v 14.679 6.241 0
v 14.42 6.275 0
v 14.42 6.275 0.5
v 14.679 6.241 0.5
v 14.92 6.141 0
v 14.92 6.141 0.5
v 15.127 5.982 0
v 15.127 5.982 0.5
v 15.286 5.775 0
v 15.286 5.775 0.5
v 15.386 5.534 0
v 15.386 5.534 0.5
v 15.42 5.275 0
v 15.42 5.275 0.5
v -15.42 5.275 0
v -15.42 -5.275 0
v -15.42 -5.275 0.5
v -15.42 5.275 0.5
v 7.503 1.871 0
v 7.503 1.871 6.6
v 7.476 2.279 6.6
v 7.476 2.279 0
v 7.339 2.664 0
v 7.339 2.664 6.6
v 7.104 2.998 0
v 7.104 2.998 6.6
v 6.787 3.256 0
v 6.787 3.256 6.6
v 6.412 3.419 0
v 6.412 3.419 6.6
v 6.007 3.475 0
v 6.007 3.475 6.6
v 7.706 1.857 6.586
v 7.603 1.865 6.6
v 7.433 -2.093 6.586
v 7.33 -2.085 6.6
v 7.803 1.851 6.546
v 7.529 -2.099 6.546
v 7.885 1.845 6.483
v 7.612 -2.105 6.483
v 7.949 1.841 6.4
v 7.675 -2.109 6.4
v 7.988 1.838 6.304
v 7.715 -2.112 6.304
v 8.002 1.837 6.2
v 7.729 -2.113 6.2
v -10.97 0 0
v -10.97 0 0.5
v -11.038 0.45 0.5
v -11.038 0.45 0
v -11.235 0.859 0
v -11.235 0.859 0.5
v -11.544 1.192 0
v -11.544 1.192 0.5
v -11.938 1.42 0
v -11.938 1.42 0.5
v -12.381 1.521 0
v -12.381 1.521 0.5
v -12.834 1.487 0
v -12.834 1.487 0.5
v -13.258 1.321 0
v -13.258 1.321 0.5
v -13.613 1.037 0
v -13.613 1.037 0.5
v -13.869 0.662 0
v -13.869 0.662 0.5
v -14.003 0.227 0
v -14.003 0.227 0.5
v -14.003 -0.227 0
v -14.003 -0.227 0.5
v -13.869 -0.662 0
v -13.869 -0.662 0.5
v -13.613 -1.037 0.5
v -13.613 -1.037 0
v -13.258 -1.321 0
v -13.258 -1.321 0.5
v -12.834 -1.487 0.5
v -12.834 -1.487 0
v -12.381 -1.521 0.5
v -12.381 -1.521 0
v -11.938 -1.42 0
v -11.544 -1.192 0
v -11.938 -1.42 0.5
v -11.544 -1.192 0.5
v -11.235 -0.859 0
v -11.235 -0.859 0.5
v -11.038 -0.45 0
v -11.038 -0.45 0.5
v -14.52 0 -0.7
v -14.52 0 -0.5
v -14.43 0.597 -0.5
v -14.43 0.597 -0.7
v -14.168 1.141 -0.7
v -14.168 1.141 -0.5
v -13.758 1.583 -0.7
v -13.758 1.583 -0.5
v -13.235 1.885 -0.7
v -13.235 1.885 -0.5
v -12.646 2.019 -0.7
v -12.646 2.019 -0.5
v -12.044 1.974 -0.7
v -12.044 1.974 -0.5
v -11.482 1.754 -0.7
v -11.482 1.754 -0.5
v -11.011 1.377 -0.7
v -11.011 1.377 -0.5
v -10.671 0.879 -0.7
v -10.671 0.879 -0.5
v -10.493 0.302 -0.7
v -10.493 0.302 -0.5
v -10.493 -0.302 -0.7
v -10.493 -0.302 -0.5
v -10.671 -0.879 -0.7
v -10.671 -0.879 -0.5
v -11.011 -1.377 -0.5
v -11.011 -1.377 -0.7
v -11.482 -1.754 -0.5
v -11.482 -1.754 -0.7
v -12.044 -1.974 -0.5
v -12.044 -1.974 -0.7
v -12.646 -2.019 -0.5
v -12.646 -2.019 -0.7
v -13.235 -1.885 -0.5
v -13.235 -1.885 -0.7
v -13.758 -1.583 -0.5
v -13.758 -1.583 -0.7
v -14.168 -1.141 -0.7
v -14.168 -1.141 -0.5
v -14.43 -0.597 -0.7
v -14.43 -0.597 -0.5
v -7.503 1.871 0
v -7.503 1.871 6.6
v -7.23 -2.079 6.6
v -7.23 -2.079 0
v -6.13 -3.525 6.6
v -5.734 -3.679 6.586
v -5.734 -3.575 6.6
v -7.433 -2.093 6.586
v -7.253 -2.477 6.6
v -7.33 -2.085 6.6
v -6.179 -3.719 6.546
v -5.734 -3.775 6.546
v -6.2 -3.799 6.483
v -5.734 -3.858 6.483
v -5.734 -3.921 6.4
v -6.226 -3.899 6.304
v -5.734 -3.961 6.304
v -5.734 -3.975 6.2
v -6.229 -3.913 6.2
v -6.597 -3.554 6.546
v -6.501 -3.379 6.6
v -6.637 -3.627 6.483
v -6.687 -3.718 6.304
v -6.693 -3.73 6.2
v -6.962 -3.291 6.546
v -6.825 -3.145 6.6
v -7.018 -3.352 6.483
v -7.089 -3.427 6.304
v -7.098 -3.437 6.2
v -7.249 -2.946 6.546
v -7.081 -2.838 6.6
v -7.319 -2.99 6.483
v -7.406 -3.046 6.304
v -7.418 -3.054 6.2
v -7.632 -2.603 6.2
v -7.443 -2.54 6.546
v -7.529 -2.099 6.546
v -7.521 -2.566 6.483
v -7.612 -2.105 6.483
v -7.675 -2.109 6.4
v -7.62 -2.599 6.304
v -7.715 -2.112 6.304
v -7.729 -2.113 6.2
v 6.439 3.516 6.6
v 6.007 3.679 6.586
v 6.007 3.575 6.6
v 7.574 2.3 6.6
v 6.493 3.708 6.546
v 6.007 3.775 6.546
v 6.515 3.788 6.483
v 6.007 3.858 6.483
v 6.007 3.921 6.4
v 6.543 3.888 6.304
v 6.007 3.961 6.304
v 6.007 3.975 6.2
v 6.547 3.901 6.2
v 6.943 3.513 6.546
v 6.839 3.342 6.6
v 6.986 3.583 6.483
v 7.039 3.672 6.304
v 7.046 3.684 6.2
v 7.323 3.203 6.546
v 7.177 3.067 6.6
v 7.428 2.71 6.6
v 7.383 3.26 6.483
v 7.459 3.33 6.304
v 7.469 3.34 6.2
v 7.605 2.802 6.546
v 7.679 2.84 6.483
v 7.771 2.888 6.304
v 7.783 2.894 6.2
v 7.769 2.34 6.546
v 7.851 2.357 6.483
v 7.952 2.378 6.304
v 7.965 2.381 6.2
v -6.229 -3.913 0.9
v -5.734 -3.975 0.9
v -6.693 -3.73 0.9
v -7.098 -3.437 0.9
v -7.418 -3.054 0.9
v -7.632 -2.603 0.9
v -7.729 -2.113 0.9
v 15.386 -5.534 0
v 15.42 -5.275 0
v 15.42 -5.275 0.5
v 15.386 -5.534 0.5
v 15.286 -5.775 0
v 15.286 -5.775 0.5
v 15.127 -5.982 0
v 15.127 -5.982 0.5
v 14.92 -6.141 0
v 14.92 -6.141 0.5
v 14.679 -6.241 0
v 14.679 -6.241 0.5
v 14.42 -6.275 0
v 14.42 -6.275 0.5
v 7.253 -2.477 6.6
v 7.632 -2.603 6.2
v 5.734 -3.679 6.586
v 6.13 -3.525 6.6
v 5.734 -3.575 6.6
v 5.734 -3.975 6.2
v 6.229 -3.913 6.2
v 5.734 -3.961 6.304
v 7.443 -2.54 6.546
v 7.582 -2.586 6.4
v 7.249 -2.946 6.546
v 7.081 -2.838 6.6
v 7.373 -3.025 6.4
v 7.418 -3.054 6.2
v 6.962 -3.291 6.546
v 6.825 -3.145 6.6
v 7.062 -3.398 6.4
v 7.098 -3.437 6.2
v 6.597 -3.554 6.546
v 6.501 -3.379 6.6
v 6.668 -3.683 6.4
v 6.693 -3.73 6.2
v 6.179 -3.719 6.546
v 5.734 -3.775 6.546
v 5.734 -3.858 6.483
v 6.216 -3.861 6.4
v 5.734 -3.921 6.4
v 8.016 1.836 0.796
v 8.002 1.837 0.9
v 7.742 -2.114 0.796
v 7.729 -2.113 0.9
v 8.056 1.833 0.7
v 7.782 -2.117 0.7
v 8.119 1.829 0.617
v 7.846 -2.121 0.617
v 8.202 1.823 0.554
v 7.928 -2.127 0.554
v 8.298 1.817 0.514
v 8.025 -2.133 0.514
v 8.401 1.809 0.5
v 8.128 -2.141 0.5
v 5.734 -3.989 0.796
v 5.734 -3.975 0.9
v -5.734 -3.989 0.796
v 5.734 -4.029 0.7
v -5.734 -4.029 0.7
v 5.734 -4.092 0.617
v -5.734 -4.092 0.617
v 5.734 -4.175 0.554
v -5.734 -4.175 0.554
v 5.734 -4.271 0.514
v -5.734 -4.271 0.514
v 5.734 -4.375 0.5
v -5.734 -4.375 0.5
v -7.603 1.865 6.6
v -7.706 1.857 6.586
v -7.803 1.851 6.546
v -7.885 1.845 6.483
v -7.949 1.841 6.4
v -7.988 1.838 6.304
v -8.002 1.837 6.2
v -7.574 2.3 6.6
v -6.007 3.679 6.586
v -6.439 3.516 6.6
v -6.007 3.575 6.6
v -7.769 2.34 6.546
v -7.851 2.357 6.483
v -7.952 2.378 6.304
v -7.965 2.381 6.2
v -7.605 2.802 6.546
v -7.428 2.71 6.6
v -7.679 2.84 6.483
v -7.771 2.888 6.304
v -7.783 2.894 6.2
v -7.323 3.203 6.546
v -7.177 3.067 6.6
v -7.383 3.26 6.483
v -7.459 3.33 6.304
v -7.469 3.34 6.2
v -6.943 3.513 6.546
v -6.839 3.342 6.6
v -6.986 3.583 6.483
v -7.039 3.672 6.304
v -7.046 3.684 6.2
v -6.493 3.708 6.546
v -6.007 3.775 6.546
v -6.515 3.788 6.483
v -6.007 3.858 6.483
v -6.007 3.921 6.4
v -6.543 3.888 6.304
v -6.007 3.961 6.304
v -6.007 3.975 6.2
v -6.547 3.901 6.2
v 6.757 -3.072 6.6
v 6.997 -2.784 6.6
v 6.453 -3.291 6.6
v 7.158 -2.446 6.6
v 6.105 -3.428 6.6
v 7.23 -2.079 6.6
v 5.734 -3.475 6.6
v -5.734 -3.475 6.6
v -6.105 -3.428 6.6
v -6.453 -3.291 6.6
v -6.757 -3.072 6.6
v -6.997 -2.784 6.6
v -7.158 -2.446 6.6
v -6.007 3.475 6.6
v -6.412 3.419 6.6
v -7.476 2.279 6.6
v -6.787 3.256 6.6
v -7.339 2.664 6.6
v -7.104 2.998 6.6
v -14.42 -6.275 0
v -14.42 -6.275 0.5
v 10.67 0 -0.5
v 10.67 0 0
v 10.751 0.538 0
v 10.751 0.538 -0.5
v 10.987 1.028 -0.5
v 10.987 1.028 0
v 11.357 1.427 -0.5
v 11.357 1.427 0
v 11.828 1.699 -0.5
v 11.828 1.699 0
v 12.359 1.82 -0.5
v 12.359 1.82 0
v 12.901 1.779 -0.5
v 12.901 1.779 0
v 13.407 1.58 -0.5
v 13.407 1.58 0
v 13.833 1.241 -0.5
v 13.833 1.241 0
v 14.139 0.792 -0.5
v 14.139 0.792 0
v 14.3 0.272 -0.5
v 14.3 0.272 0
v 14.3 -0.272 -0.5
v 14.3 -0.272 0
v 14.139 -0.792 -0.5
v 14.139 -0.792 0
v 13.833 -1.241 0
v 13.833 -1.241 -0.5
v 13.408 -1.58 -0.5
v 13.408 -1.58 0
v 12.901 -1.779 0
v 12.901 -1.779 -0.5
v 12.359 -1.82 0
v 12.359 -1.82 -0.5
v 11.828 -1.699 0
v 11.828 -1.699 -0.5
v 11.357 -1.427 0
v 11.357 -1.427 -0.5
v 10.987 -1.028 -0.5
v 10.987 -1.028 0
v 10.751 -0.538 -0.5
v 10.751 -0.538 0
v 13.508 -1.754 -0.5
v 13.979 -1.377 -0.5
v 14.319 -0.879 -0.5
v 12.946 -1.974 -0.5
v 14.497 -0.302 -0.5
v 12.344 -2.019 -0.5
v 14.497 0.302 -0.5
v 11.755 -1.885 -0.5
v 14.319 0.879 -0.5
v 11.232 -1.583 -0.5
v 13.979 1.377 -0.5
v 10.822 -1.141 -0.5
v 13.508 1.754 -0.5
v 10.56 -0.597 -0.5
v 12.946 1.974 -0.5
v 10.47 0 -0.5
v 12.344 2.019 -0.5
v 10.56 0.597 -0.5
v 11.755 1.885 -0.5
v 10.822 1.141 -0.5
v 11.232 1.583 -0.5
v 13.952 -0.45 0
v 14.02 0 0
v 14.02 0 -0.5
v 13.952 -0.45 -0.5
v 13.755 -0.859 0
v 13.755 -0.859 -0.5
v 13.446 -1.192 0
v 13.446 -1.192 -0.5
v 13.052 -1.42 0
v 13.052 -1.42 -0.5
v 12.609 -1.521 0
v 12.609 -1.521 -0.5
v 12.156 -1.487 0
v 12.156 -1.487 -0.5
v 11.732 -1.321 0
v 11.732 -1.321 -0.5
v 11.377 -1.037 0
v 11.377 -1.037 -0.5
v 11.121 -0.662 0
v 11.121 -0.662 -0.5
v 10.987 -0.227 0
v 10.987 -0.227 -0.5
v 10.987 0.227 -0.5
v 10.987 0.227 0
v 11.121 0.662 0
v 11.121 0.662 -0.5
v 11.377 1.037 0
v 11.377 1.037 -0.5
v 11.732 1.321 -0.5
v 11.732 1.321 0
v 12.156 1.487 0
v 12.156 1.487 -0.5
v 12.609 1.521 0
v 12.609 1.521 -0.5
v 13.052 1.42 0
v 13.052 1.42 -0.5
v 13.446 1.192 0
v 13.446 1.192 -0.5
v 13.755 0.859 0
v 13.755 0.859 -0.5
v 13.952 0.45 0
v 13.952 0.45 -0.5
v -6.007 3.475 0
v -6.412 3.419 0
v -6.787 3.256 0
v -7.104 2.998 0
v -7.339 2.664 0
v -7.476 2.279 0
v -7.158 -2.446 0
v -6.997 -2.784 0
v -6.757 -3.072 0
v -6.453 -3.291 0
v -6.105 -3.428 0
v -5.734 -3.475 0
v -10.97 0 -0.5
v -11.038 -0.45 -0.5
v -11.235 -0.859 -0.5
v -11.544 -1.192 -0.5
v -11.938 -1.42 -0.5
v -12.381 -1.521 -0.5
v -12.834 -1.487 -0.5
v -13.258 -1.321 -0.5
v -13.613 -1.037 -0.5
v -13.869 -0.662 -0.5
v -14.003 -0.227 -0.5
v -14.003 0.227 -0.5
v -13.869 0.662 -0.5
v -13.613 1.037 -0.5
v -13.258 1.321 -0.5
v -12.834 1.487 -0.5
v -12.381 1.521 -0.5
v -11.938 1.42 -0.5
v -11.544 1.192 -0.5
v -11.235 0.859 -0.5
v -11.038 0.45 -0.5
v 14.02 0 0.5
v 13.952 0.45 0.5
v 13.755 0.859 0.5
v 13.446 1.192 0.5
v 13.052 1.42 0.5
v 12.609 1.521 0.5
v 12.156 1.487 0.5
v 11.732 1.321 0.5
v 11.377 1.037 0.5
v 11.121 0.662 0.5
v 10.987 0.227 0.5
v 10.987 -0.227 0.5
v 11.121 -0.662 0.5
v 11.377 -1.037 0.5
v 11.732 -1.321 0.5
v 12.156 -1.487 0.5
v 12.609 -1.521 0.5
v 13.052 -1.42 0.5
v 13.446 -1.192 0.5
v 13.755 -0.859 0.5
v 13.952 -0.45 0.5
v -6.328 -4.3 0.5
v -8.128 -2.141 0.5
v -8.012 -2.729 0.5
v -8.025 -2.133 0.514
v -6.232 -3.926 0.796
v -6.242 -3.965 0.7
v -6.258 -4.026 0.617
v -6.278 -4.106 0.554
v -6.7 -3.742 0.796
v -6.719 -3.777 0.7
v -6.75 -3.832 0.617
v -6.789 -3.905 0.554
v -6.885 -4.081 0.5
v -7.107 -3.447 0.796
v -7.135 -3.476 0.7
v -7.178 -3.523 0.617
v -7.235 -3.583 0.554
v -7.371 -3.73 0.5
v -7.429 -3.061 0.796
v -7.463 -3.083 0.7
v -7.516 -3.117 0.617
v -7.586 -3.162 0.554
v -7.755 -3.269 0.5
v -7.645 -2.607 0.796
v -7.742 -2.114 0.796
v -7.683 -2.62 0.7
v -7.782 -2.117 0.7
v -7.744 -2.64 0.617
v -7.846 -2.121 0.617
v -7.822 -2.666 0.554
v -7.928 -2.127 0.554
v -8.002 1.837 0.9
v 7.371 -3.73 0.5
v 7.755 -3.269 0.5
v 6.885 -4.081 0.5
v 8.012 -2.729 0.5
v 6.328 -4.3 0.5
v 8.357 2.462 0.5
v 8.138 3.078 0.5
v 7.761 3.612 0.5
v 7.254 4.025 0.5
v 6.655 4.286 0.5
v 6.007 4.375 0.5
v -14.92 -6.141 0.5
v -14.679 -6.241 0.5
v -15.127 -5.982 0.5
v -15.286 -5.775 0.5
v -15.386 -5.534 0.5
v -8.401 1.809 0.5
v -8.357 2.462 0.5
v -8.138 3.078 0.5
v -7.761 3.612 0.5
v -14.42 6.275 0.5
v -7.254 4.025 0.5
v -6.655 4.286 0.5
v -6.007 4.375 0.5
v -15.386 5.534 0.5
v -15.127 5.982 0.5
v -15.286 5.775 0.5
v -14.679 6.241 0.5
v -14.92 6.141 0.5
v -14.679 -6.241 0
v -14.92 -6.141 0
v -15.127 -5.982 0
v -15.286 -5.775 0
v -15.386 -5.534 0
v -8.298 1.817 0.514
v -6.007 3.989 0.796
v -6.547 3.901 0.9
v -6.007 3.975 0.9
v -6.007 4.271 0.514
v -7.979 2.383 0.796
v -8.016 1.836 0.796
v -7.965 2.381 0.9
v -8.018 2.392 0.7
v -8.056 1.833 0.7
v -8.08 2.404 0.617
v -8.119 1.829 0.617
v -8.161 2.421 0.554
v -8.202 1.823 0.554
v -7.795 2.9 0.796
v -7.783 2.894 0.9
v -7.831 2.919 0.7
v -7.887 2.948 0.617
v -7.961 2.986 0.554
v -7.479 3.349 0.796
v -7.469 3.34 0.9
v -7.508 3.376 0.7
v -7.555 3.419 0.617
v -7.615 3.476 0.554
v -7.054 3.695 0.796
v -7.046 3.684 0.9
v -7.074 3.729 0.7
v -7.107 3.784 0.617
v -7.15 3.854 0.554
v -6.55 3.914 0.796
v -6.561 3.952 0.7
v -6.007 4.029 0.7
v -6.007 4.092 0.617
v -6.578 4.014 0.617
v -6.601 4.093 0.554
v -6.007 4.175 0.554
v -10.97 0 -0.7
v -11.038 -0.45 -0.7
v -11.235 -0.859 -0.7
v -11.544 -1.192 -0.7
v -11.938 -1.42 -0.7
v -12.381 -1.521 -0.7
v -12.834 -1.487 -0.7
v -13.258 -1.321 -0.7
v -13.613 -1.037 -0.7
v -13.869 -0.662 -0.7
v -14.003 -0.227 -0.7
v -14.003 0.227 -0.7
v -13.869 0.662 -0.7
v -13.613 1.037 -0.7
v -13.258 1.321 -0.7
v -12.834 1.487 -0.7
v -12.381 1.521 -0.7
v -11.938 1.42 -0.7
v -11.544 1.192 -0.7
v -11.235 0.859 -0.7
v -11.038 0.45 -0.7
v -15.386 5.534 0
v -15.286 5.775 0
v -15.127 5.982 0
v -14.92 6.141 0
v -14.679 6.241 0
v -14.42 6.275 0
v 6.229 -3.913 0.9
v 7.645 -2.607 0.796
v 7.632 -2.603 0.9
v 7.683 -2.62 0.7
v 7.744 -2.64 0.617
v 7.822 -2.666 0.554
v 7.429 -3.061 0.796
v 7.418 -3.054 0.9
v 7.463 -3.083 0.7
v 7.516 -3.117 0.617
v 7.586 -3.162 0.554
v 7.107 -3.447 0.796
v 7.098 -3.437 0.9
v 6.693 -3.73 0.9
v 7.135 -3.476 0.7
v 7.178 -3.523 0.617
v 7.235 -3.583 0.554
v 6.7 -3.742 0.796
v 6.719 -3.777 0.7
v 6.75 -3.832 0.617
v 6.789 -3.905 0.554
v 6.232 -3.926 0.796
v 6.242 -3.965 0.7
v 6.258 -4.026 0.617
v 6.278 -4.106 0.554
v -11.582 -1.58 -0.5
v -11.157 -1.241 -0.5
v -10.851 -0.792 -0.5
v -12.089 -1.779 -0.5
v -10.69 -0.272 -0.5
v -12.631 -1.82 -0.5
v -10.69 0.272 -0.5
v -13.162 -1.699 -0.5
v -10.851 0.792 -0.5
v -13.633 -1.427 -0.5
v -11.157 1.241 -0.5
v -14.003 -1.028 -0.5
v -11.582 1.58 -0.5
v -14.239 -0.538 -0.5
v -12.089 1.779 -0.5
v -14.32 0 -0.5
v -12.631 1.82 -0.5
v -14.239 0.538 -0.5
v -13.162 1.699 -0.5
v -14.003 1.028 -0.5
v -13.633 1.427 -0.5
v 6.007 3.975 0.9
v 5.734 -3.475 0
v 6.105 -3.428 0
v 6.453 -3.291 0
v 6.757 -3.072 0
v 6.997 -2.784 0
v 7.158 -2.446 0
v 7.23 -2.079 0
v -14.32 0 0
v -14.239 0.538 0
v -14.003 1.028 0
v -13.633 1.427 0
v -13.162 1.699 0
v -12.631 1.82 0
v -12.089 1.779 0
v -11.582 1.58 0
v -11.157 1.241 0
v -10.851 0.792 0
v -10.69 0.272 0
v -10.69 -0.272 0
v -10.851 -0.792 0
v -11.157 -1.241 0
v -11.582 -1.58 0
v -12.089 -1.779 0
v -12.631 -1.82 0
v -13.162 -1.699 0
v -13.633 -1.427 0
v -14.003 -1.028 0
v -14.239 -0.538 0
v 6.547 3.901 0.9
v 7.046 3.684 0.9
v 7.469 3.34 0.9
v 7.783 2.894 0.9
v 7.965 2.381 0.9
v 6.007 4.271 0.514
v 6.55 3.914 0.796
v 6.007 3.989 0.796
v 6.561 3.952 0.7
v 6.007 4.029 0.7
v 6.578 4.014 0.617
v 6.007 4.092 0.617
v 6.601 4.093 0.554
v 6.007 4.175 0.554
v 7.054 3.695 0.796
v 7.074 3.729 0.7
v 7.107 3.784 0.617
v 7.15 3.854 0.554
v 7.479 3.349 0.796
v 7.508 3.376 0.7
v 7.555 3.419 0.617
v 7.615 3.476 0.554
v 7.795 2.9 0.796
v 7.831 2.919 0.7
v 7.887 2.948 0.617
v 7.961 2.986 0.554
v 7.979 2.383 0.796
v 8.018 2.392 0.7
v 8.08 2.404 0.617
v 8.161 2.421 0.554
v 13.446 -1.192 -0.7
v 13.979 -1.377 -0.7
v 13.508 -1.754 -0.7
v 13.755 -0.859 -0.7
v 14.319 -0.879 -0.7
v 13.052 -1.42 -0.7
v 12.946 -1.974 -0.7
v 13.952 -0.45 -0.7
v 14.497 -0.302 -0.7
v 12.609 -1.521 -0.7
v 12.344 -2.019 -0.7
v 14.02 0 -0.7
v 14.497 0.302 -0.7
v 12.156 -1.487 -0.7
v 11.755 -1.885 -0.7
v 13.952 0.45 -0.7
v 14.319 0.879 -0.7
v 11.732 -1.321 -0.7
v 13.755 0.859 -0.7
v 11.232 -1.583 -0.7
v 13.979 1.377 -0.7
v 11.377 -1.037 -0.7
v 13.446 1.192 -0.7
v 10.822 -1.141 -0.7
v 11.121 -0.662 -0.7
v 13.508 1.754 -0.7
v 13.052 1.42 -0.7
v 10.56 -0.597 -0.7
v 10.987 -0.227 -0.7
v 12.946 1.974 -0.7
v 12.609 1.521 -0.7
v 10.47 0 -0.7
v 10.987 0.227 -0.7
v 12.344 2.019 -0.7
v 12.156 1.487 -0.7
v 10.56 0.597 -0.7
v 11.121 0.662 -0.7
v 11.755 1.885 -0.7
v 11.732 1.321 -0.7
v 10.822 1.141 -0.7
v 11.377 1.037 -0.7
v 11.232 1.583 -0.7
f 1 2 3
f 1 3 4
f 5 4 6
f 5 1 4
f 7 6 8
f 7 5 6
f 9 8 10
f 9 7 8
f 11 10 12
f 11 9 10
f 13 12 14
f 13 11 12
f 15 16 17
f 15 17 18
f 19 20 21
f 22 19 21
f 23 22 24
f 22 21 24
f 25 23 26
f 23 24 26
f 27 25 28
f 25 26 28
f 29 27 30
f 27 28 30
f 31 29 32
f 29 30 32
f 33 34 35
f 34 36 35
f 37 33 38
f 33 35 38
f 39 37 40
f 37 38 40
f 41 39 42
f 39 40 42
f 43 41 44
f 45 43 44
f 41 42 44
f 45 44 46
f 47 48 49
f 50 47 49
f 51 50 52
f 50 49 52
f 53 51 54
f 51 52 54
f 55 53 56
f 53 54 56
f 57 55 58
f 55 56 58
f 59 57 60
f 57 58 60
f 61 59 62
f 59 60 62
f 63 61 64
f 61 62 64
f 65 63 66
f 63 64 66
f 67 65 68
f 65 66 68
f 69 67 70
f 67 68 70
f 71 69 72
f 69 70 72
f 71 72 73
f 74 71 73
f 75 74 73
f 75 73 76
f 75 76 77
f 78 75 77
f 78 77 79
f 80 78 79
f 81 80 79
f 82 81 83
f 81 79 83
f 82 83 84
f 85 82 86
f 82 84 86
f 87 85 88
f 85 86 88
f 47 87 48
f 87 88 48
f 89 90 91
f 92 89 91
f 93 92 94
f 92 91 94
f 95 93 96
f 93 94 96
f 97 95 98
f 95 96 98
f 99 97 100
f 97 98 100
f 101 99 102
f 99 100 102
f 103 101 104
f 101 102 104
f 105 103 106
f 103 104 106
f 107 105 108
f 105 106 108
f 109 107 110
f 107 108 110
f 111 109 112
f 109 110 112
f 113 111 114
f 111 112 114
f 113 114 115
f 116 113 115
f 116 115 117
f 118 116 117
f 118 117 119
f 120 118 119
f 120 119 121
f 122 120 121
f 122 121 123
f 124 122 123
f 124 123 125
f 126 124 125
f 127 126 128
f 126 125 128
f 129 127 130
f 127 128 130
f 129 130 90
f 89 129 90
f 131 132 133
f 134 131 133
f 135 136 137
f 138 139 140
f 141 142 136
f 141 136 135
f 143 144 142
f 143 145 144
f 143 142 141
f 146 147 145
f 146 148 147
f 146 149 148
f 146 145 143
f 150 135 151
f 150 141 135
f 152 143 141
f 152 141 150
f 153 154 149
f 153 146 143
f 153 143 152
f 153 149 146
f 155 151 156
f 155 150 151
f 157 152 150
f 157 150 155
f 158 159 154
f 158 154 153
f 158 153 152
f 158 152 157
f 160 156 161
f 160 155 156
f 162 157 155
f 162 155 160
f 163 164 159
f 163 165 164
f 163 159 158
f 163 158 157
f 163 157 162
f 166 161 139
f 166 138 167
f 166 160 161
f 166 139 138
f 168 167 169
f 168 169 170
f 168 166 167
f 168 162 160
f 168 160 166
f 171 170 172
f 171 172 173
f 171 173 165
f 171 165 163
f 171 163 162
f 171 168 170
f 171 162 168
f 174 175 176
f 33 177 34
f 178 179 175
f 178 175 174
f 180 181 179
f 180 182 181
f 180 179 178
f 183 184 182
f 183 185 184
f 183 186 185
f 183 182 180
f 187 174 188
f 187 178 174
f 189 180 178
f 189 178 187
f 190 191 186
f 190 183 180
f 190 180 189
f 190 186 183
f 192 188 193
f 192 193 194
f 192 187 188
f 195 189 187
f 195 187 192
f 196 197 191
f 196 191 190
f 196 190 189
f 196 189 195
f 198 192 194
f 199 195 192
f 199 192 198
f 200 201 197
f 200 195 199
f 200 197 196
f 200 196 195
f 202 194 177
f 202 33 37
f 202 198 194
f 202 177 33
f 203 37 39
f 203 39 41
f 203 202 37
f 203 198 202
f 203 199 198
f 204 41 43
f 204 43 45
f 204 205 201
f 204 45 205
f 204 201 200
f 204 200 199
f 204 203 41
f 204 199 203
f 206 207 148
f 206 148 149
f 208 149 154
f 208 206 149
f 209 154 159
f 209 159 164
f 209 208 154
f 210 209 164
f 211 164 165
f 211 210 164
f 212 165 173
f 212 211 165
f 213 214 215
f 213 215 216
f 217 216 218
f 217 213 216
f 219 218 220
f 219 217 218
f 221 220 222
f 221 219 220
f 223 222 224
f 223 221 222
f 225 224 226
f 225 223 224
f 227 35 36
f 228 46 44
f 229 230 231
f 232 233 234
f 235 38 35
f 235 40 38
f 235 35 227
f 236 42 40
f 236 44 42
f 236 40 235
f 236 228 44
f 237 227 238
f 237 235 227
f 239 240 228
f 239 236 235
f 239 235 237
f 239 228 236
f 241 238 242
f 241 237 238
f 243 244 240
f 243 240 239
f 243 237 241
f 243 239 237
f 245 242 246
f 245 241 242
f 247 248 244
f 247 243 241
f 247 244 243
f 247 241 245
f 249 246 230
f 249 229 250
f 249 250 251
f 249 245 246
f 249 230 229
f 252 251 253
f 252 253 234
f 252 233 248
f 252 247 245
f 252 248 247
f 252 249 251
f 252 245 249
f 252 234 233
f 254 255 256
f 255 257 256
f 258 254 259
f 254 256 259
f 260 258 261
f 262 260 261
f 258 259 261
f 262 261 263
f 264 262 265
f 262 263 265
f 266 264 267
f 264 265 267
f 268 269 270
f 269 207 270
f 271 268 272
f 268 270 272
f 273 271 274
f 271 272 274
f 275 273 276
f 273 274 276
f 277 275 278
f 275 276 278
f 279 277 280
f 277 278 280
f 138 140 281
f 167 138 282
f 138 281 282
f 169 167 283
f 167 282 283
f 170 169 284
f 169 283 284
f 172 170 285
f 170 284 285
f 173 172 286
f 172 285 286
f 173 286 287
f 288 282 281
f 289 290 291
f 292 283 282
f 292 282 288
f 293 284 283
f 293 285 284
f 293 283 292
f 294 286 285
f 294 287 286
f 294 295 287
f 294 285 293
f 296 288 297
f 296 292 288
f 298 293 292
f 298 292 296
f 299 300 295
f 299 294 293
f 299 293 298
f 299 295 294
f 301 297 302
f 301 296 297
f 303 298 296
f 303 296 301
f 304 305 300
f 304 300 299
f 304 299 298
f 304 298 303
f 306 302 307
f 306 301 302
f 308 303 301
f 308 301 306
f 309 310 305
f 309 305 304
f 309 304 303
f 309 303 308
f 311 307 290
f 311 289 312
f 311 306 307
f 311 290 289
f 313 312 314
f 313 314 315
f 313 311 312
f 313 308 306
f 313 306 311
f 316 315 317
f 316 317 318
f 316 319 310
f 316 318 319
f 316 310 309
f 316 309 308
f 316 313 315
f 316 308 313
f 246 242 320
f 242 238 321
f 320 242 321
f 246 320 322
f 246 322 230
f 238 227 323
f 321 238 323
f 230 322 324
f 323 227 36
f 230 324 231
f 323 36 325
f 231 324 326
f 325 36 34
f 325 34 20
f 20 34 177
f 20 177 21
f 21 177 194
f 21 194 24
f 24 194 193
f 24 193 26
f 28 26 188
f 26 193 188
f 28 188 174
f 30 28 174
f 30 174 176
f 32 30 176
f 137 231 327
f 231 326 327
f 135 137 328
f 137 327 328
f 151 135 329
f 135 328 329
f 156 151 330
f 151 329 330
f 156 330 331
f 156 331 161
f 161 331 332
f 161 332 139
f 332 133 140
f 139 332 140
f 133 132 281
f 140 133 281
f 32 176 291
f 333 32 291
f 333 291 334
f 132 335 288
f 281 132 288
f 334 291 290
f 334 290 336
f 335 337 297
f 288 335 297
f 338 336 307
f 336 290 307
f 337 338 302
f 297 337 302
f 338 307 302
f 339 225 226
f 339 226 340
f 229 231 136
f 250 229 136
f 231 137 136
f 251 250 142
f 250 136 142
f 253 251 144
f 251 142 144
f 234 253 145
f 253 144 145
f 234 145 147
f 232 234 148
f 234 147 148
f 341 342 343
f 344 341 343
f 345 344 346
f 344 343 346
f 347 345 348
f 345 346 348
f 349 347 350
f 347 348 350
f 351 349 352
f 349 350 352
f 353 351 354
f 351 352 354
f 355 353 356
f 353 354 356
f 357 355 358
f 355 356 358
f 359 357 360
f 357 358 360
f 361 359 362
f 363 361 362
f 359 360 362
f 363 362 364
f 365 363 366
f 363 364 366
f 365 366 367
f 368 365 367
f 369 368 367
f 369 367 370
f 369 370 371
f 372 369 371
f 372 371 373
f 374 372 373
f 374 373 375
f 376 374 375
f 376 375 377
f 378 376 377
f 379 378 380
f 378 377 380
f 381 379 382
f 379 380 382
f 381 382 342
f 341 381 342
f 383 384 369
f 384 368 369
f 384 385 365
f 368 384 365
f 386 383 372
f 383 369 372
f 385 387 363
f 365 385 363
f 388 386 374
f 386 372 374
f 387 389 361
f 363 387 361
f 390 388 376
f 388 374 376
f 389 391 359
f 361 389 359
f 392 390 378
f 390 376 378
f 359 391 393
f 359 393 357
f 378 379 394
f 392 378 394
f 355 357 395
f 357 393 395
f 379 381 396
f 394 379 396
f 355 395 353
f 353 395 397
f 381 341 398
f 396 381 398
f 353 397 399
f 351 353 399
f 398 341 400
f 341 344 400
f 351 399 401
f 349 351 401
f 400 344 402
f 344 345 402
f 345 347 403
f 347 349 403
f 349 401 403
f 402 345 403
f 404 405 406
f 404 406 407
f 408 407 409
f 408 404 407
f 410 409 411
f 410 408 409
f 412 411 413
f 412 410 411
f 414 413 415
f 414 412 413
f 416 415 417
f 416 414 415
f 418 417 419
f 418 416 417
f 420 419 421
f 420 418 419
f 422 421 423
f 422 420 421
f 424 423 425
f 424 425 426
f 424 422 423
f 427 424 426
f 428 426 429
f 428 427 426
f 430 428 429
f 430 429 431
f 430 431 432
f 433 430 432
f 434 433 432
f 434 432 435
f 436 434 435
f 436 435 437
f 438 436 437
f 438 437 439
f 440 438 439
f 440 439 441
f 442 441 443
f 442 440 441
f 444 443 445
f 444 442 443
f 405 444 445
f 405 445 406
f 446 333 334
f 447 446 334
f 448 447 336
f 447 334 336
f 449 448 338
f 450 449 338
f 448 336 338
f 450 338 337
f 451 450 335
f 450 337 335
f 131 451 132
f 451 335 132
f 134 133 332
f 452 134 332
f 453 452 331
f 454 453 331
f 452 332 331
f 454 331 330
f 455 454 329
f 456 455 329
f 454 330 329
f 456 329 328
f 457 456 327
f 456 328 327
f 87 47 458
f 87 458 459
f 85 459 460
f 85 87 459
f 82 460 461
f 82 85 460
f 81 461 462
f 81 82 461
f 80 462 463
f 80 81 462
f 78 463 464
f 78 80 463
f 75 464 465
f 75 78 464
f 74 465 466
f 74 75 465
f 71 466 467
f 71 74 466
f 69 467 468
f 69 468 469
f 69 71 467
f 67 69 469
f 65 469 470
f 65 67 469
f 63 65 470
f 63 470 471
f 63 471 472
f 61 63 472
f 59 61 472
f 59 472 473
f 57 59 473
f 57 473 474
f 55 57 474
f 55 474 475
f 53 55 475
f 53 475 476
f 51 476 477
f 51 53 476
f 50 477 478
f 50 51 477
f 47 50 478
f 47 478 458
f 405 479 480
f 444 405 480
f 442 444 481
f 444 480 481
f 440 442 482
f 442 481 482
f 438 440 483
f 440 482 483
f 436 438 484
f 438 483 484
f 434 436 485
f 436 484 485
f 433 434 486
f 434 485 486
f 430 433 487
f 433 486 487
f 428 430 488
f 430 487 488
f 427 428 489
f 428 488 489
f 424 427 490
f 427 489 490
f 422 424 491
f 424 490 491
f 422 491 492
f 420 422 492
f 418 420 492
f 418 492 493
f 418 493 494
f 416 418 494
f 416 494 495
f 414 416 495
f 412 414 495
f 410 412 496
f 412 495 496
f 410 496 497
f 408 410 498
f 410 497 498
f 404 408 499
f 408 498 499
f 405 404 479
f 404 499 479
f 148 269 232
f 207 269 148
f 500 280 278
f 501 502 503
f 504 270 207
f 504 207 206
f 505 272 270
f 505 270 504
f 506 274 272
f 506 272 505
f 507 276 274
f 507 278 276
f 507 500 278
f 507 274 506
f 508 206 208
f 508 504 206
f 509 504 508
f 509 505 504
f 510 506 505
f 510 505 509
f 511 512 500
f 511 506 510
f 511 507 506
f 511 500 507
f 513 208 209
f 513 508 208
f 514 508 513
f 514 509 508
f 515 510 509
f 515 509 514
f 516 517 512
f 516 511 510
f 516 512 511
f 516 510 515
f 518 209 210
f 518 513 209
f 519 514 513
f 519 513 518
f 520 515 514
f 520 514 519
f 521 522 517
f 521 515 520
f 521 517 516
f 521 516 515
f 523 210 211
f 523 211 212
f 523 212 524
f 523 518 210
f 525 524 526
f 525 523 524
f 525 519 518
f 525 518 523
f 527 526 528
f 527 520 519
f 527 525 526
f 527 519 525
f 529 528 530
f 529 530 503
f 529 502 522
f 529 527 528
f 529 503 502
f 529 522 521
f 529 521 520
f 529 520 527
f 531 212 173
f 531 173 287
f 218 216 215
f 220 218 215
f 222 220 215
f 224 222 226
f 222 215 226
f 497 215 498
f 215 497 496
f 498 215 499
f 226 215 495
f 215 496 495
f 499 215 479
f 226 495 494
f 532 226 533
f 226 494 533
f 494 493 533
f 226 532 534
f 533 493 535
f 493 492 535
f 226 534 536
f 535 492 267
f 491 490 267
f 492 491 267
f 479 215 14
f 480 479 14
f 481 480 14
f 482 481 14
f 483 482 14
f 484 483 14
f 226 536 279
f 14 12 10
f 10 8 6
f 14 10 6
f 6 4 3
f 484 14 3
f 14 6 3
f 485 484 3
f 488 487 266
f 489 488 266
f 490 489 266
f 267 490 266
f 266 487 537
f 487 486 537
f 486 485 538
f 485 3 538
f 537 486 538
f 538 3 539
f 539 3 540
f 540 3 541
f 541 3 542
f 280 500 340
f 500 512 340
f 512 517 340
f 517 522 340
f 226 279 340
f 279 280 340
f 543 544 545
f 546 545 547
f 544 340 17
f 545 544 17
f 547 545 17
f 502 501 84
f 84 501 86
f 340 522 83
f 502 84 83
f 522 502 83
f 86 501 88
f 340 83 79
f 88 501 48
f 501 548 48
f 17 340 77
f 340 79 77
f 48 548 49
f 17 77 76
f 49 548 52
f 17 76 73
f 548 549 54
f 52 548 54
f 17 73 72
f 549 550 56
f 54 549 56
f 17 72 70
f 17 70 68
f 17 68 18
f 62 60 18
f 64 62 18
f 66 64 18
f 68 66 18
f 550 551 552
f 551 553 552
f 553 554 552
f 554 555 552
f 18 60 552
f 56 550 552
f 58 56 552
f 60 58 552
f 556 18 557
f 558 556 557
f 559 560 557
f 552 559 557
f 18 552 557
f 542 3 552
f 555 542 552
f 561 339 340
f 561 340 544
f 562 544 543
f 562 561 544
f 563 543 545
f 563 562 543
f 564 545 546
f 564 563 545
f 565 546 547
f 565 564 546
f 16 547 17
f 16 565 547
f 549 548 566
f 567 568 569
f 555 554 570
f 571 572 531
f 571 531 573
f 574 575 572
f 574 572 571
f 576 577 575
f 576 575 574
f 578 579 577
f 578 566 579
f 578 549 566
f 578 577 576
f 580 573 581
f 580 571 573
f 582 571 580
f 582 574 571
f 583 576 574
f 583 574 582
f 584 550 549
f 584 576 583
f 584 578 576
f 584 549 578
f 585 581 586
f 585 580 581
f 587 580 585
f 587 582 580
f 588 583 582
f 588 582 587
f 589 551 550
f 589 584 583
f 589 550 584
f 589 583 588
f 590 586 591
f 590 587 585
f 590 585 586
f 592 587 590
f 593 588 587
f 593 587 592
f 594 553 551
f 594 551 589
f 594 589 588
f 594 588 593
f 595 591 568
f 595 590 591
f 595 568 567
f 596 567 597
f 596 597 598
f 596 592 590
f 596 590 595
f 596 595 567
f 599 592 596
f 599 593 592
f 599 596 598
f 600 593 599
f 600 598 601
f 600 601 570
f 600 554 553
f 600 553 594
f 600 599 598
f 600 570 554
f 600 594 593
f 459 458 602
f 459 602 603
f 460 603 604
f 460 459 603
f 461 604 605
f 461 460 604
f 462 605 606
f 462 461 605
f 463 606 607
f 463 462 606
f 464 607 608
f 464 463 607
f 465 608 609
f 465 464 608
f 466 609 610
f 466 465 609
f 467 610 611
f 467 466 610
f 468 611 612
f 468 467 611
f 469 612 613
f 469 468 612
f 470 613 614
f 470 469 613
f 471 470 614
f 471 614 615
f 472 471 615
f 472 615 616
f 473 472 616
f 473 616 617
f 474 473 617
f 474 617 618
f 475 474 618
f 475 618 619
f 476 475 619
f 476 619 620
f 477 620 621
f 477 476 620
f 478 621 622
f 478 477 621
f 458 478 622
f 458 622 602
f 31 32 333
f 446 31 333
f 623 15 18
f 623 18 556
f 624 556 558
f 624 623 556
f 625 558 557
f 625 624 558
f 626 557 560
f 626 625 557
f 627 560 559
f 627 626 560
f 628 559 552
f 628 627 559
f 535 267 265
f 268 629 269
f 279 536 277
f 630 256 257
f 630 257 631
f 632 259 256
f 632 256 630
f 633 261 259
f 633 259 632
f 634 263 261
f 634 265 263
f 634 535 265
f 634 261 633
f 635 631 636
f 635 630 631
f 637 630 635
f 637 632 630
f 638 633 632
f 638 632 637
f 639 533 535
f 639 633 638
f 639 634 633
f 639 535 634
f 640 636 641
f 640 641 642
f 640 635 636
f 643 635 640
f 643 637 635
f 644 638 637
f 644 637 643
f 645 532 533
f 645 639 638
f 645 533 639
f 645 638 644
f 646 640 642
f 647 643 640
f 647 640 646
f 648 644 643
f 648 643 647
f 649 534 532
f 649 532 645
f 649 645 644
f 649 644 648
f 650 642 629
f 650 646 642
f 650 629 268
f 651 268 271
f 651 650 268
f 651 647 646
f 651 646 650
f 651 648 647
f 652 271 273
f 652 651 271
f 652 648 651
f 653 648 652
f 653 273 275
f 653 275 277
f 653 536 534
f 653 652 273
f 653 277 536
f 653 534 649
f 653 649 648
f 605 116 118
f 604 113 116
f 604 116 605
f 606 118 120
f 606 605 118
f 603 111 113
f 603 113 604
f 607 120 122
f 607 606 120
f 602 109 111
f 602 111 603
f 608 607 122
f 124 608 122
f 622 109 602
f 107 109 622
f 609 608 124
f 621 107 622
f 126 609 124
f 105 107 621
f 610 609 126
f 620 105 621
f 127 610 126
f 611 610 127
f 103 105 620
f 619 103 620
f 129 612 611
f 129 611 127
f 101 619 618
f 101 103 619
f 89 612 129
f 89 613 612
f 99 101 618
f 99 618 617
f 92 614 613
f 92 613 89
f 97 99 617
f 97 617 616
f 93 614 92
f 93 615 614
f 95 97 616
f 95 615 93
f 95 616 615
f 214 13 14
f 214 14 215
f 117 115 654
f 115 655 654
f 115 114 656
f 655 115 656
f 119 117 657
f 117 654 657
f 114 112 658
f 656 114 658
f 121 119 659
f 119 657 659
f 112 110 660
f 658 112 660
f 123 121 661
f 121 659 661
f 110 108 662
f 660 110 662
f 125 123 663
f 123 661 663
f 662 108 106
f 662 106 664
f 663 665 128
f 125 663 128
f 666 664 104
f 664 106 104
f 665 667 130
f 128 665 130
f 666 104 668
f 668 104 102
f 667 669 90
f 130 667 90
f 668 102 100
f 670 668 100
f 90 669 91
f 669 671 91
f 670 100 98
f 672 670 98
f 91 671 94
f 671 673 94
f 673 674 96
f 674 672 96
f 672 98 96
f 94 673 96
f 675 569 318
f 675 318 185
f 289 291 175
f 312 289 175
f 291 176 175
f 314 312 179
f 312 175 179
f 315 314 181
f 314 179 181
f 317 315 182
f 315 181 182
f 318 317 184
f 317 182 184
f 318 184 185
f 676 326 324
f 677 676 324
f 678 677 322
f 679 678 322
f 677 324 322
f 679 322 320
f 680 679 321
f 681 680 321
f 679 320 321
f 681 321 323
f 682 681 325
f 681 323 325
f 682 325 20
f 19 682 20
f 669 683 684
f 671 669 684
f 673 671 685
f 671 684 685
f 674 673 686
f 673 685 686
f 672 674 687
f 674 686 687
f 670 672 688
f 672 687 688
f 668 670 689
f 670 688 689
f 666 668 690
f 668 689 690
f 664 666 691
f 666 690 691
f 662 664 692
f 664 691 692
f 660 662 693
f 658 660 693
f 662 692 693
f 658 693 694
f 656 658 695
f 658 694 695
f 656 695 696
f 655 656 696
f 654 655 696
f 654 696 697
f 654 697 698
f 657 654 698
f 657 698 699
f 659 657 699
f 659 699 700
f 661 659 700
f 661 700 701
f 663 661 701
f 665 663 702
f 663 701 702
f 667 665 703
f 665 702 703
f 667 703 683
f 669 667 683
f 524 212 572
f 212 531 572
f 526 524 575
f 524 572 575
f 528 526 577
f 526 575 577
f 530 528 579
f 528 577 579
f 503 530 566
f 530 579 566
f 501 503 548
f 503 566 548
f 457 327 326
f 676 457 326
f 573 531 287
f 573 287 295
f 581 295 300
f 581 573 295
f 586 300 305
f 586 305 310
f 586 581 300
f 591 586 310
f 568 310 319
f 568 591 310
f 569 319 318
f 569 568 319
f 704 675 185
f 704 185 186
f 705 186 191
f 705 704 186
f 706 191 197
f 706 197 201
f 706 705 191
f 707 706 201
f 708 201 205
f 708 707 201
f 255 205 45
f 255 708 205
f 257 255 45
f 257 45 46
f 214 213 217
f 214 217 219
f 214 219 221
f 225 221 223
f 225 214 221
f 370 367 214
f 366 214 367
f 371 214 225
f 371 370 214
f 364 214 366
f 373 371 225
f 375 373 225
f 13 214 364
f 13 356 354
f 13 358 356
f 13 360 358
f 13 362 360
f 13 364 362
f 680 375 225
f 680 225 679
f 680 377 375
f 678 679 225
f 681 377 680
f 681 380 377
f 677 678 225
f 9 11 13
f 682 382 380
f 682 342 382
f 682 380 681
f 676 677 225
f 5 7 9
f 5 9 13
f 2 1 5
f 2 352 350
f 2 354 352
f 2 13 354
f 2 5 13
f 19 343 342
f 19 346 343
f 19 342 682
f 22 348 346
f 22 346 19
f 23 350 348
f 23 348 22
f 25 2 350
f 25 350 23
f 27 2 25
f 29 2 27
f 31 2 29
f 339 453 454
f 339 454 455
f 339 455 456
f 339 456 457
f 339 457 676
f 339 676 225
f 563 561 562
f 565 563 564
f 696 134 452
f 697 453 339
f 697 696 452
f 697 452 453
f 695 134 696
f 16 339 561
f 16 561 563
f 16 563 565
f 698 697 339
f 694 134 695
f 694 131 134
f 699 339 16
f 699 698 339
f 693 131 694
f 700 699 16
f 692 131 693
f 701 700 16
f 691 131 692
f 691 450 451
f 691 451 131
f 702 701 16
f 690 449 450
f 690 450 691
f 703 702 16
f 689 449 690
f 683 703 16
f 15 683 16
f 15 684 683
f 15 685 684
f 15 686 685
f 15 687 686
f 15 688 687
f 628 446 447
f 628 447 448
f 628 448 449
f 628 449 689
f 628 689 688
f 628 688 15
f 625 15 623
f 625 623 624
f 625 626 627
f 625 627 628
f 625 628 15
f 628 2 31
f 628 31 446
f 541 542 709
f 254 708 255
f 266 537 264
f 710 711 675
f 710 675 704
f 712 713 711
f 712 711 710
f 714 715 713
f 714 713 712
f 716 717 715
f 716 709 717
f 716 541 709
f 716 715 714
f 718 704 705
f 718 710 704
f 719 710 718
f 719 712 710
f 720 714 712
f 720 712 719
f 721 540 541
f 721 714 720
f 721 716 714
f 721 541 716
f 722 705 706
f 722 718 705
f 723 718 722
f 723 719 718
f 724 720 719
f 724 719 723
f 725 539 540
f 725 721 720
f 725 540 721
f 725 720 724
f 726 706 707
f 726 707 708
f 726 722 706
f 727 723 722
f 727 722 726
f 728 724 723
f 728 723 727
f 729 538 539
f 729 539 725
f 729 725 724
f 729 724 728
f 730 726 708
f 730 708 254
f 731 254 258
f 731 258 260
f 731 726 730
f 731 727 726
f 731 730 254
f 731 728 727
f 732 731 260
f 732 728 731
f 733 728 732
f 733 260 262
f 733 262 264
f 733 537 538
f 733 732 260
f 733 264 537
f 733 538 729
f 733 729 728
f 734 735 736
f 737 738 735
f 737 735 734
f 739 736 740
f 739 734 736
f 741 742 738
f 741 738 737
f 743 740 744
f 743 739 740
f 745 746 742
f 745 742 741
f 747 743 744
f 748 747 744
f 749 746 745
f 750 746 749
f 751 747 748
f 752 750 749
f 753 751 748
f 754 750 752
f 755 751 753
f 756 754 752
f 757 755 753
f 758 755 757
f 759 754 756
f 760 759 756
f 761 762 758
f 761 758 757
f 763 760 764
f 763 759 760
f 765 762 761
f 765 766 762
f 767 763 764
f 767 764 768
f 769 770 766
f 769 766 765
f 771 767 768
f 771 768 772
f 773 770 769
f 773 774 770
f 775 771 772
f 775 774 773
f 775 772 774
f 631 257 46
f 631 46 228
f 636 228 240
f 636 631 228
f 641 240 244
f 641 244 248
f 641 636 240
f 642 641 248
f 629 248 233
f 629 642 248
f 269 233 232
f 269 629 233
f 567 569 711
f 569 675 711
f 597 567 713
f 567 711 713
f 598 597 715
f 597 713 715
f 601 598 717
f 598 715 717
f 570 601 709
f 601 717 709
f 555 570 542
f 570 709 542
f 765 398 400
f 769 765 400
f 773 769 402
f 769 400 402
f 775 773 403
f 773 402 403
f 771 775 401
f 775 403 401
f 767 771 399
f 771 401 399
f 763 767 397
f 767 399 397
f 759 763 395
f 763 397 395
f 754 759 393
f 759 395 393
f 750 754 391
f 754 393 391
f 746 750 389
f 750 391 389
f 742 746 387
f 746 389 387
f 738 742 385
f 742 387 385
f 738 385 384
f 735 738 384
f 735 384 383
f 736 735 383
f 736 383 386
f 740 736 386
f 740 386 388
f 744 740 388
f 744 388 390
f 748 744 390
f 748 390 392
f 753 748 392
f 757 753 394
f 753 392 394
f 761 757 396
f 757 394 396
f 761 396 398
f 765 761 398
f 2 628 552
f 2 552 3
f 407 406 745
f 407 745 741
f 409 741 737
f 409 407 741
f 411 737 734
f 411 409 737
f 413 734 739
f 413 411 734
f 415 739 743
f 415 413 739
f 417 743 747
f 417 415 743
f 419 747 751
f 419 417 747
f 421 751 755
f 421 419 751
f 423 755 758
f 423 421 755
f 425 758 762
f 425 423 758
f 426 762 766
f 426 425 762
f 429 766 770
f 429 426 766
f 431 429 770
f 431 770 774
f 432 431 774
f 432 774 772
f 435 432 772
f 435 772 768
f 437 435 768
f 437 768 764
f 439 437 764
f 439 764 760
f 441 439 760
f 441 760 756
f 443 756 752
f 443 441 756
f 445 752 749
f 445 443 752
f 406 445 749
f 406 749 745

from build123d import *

# Parameters (mm, degrees)
BOSS_EXTRUDE1_DEPTH = 0.5
SKETCH2_R           = 1.525
CUT_EXTRUDE1_DEPTH  = 0.5
BOSS_EXTRUDE2_DEPTH = 6.1
SKETCH9_R           = 1.825
SKETCH9_R_2         = 1.525
BOSS_EXTRUDE3_DEPTH = 0.5
SKETCH10_R          = 2.025
SKETCH10_R_2        = 1.525
BOSS_EXTRUDE4_DEPTH = 0.2
CUT_EXTRUDE2_DEPTH  = 6.6
FILLET1_R           = 0.4
FILLET2_R           = 0.4


with BuildPart() as part:
    # Sketch1 → Boss-Extrude1 (new body)
    with BuildSketch(Plane.XY):
        with BuildLine():
            Line((-14.42, 6.275), (14.42, 6.275))
            ThreePointArc((14.42, 6.275), (15.127106781, 5.982106781), (15.42, 5.275))
            Line((15.42, 5.275), (15.42, -5.275))
            ThreePointArc((15.42, -5.275), (15.127106781, -5.982106781), (14.42, -6.275))
            Line((14.42, -6.275), (-14.42, -6.275))
            ThreePointArc((-14.42, -6.275), (-15.127106781, -5.982106781), (-15.42, -5.275))
            Line((-15.42, -5.275), (-15.42, 5.275))
            ThreePointArc((-15.42, 5.275), (-15.127106781, 5.982106781), (-14.42, 6.275))
        make_face()
    extrude(amount=BOSS_EXTRUDE1_DEPTH)

    # Sketch2 → Cut-Extrude1 (cut)
    with BuildSketch(Plane.XY.offset(0.5)):
        with Locations((-12.495, 0)):
            Circle(SKETCH2_R)
        with Locations((12.495, 0)):
            Circle(SKETCH2_R)
    extrude(amount=-CUT_EXTRUDE1_DEPTH, mode=Mode.SUBTRACT)

    # Sketch3 → Boss-Extrude2 (add)
    with BuildSketch(Plane.XY.offset(0.5)):
        with BuildLine():
            Line((-6.00685473, 3.975), (6.00685473, 3.975))
            ThreePointArc((6.00685473, 3.975), (7.469056783, 3.339538441), (8.00208564, 1.836965157))
            Line((8.00208564, 1.836965157), (7.7288152, -2.113034843))
            ThreePointArc((7.7288152, -2.113034843), (7.098122731, -3.437202053), (5.73358429, -3.975))
            Line((5.73358429, -3.975), (-5.73358429, -3.975))
            ThreePointArc((-5.73358429, -3.975), (-7.098122731, -3.437202053), (-7.7288152, -2.113034843))
            Line((-7.7288152, -2.113034843), (-8.00208564, 1.836965157))
            ThreePointArc((-8.00208564, 1.836965157), (-7.469056783, 3.339538441), (-6.00685473, 3.975))
        make_face()
    extrude(amount=BOSS_EXTRUDE2_DEPTH)

    # Sketch9 → Boss-Extrude3 (add)
    with BuildSketch(Plane(origin=(0, 0, 0), x_dir=(-1, 0, 0), z_dir=(0, 0, -1))):
        with Locations((-12.495, 0)):
            Circle(SKETCH9_R)
        with Locations(Location((-12.495, 0, 0), (0, 0, 180))):
            Circle(SKETCH9_R_2, mode=Mode.SUBTRACT)
        with Locations((12.495, 0)):
            Circle(SKETCH9_R)
        with Locations(Location((12.495, 0, 0), (0, 0, 180))):
            Circle(SKETCH9_R_2, mode=Mode.SUBTRACT)
    extrude(amount=BOSS_EXTRUDE3_DEPTH)

    # Sketch10 → Boss-Extrude4 (add)
    with BuildSketch(Plane(origin=(0, 0, -0.5), x_dir=(-1, 0, 0), z_dir=(0, 0, -1))):
        with Locations((-12.495, 0)):
            Circle(SKETCH10_R)
        with Locations(Location((-12.495, 0, 0), (0, 0, 180))):
            Circle(SKETCH10_R_2, mode=Mode.SUBTRACT)
        with Locations((12.495, 0)):
            Circle(SKETCH10_R)
        with Locations(Location((12.495, 0, 0), (0, 0, 180))):
            Circle(SKETCH10_R_2, mode=Mode.SUBTRACT)
    extrude(amount=BOSS_EXTRUDE4_DEPTH)

    # Sketch11 → Cut-Extrude2 (cut)
    with BuildSketch(Plane.XY.offset(6.6)):
        with BuildLine():
            Line((-7.503277912, 1.871473868), (-7.230007472, -2.078526132))
            ThreePointArc((-7.230007472, -2.078526132), (-6.756988121, -3.071651539), (-5.73358429, -3.475))
            Line((-5.73358429, -3.475), (5.73358429, -3.475))
            ThreePointArc((5.73358429, -3.475), (6.756988121, -3.071651539), (7.230007472, -2.078526132))
            Line((7.230007472, -2.078526132), (7.503277912, 1.871473868))
            ThreePointArc((7.503277912, 1.871473868), (7.10350627, 2.998403831), (6.00685473, 3.475))
            Line((6.00685473, 3.475), (-6.00685473, 3.475))
            ThreePointArc((-6.00685473, 3.475), (-7.10350627, 2.998403831), (-7.503277912, 1.871473868))
        make_face()
    extrude(amount=-CUT_EXTRUDE2_DEPTH, mode=Mode.SUBTRACT)

    # Fillet1
    fillet1_edges = [part.edges().sort_by_distance(p)[0] for p in [
        (7.098122731, -3.437202053, 6.6),
        (7.86545042, -0.138034843, 6.6),
        (7.469056783, 3.339538441, 6.6),
        (0, 3.975, 6.6),
        (-7.469056783, 3.339538441, 6.6),
        (-7.86545042, -0.138034843, 6.6),
        (-7.098122731, -3.437202053, 6.6),
        (0, -3.975, 6.6),
    ]]
    fillet(fillet1_edges, radius=FILLET1_R)

    # Fillet2
    fillet2_edges = [part.edges().sort_by_distance(p)[0] for p in [
        (7.098122731, -3.437202053, 0.5),
        (7.86545042, -0.138034843, 0.5),
        (7.469056783, 3.339538441, 0.5),
        (0, 3.975, 0.5),
        (-7.469056783, 3.339538441, 0.5),
        (-7.86545042, -0.138034843, 0.5),
        (-7.098122731, -3.437202053, 0.5),
        (0, -3.975, 0.5),
    ]]
    fillet(fillet2_edges, radius=FILLET2_R)


solid = part.part
